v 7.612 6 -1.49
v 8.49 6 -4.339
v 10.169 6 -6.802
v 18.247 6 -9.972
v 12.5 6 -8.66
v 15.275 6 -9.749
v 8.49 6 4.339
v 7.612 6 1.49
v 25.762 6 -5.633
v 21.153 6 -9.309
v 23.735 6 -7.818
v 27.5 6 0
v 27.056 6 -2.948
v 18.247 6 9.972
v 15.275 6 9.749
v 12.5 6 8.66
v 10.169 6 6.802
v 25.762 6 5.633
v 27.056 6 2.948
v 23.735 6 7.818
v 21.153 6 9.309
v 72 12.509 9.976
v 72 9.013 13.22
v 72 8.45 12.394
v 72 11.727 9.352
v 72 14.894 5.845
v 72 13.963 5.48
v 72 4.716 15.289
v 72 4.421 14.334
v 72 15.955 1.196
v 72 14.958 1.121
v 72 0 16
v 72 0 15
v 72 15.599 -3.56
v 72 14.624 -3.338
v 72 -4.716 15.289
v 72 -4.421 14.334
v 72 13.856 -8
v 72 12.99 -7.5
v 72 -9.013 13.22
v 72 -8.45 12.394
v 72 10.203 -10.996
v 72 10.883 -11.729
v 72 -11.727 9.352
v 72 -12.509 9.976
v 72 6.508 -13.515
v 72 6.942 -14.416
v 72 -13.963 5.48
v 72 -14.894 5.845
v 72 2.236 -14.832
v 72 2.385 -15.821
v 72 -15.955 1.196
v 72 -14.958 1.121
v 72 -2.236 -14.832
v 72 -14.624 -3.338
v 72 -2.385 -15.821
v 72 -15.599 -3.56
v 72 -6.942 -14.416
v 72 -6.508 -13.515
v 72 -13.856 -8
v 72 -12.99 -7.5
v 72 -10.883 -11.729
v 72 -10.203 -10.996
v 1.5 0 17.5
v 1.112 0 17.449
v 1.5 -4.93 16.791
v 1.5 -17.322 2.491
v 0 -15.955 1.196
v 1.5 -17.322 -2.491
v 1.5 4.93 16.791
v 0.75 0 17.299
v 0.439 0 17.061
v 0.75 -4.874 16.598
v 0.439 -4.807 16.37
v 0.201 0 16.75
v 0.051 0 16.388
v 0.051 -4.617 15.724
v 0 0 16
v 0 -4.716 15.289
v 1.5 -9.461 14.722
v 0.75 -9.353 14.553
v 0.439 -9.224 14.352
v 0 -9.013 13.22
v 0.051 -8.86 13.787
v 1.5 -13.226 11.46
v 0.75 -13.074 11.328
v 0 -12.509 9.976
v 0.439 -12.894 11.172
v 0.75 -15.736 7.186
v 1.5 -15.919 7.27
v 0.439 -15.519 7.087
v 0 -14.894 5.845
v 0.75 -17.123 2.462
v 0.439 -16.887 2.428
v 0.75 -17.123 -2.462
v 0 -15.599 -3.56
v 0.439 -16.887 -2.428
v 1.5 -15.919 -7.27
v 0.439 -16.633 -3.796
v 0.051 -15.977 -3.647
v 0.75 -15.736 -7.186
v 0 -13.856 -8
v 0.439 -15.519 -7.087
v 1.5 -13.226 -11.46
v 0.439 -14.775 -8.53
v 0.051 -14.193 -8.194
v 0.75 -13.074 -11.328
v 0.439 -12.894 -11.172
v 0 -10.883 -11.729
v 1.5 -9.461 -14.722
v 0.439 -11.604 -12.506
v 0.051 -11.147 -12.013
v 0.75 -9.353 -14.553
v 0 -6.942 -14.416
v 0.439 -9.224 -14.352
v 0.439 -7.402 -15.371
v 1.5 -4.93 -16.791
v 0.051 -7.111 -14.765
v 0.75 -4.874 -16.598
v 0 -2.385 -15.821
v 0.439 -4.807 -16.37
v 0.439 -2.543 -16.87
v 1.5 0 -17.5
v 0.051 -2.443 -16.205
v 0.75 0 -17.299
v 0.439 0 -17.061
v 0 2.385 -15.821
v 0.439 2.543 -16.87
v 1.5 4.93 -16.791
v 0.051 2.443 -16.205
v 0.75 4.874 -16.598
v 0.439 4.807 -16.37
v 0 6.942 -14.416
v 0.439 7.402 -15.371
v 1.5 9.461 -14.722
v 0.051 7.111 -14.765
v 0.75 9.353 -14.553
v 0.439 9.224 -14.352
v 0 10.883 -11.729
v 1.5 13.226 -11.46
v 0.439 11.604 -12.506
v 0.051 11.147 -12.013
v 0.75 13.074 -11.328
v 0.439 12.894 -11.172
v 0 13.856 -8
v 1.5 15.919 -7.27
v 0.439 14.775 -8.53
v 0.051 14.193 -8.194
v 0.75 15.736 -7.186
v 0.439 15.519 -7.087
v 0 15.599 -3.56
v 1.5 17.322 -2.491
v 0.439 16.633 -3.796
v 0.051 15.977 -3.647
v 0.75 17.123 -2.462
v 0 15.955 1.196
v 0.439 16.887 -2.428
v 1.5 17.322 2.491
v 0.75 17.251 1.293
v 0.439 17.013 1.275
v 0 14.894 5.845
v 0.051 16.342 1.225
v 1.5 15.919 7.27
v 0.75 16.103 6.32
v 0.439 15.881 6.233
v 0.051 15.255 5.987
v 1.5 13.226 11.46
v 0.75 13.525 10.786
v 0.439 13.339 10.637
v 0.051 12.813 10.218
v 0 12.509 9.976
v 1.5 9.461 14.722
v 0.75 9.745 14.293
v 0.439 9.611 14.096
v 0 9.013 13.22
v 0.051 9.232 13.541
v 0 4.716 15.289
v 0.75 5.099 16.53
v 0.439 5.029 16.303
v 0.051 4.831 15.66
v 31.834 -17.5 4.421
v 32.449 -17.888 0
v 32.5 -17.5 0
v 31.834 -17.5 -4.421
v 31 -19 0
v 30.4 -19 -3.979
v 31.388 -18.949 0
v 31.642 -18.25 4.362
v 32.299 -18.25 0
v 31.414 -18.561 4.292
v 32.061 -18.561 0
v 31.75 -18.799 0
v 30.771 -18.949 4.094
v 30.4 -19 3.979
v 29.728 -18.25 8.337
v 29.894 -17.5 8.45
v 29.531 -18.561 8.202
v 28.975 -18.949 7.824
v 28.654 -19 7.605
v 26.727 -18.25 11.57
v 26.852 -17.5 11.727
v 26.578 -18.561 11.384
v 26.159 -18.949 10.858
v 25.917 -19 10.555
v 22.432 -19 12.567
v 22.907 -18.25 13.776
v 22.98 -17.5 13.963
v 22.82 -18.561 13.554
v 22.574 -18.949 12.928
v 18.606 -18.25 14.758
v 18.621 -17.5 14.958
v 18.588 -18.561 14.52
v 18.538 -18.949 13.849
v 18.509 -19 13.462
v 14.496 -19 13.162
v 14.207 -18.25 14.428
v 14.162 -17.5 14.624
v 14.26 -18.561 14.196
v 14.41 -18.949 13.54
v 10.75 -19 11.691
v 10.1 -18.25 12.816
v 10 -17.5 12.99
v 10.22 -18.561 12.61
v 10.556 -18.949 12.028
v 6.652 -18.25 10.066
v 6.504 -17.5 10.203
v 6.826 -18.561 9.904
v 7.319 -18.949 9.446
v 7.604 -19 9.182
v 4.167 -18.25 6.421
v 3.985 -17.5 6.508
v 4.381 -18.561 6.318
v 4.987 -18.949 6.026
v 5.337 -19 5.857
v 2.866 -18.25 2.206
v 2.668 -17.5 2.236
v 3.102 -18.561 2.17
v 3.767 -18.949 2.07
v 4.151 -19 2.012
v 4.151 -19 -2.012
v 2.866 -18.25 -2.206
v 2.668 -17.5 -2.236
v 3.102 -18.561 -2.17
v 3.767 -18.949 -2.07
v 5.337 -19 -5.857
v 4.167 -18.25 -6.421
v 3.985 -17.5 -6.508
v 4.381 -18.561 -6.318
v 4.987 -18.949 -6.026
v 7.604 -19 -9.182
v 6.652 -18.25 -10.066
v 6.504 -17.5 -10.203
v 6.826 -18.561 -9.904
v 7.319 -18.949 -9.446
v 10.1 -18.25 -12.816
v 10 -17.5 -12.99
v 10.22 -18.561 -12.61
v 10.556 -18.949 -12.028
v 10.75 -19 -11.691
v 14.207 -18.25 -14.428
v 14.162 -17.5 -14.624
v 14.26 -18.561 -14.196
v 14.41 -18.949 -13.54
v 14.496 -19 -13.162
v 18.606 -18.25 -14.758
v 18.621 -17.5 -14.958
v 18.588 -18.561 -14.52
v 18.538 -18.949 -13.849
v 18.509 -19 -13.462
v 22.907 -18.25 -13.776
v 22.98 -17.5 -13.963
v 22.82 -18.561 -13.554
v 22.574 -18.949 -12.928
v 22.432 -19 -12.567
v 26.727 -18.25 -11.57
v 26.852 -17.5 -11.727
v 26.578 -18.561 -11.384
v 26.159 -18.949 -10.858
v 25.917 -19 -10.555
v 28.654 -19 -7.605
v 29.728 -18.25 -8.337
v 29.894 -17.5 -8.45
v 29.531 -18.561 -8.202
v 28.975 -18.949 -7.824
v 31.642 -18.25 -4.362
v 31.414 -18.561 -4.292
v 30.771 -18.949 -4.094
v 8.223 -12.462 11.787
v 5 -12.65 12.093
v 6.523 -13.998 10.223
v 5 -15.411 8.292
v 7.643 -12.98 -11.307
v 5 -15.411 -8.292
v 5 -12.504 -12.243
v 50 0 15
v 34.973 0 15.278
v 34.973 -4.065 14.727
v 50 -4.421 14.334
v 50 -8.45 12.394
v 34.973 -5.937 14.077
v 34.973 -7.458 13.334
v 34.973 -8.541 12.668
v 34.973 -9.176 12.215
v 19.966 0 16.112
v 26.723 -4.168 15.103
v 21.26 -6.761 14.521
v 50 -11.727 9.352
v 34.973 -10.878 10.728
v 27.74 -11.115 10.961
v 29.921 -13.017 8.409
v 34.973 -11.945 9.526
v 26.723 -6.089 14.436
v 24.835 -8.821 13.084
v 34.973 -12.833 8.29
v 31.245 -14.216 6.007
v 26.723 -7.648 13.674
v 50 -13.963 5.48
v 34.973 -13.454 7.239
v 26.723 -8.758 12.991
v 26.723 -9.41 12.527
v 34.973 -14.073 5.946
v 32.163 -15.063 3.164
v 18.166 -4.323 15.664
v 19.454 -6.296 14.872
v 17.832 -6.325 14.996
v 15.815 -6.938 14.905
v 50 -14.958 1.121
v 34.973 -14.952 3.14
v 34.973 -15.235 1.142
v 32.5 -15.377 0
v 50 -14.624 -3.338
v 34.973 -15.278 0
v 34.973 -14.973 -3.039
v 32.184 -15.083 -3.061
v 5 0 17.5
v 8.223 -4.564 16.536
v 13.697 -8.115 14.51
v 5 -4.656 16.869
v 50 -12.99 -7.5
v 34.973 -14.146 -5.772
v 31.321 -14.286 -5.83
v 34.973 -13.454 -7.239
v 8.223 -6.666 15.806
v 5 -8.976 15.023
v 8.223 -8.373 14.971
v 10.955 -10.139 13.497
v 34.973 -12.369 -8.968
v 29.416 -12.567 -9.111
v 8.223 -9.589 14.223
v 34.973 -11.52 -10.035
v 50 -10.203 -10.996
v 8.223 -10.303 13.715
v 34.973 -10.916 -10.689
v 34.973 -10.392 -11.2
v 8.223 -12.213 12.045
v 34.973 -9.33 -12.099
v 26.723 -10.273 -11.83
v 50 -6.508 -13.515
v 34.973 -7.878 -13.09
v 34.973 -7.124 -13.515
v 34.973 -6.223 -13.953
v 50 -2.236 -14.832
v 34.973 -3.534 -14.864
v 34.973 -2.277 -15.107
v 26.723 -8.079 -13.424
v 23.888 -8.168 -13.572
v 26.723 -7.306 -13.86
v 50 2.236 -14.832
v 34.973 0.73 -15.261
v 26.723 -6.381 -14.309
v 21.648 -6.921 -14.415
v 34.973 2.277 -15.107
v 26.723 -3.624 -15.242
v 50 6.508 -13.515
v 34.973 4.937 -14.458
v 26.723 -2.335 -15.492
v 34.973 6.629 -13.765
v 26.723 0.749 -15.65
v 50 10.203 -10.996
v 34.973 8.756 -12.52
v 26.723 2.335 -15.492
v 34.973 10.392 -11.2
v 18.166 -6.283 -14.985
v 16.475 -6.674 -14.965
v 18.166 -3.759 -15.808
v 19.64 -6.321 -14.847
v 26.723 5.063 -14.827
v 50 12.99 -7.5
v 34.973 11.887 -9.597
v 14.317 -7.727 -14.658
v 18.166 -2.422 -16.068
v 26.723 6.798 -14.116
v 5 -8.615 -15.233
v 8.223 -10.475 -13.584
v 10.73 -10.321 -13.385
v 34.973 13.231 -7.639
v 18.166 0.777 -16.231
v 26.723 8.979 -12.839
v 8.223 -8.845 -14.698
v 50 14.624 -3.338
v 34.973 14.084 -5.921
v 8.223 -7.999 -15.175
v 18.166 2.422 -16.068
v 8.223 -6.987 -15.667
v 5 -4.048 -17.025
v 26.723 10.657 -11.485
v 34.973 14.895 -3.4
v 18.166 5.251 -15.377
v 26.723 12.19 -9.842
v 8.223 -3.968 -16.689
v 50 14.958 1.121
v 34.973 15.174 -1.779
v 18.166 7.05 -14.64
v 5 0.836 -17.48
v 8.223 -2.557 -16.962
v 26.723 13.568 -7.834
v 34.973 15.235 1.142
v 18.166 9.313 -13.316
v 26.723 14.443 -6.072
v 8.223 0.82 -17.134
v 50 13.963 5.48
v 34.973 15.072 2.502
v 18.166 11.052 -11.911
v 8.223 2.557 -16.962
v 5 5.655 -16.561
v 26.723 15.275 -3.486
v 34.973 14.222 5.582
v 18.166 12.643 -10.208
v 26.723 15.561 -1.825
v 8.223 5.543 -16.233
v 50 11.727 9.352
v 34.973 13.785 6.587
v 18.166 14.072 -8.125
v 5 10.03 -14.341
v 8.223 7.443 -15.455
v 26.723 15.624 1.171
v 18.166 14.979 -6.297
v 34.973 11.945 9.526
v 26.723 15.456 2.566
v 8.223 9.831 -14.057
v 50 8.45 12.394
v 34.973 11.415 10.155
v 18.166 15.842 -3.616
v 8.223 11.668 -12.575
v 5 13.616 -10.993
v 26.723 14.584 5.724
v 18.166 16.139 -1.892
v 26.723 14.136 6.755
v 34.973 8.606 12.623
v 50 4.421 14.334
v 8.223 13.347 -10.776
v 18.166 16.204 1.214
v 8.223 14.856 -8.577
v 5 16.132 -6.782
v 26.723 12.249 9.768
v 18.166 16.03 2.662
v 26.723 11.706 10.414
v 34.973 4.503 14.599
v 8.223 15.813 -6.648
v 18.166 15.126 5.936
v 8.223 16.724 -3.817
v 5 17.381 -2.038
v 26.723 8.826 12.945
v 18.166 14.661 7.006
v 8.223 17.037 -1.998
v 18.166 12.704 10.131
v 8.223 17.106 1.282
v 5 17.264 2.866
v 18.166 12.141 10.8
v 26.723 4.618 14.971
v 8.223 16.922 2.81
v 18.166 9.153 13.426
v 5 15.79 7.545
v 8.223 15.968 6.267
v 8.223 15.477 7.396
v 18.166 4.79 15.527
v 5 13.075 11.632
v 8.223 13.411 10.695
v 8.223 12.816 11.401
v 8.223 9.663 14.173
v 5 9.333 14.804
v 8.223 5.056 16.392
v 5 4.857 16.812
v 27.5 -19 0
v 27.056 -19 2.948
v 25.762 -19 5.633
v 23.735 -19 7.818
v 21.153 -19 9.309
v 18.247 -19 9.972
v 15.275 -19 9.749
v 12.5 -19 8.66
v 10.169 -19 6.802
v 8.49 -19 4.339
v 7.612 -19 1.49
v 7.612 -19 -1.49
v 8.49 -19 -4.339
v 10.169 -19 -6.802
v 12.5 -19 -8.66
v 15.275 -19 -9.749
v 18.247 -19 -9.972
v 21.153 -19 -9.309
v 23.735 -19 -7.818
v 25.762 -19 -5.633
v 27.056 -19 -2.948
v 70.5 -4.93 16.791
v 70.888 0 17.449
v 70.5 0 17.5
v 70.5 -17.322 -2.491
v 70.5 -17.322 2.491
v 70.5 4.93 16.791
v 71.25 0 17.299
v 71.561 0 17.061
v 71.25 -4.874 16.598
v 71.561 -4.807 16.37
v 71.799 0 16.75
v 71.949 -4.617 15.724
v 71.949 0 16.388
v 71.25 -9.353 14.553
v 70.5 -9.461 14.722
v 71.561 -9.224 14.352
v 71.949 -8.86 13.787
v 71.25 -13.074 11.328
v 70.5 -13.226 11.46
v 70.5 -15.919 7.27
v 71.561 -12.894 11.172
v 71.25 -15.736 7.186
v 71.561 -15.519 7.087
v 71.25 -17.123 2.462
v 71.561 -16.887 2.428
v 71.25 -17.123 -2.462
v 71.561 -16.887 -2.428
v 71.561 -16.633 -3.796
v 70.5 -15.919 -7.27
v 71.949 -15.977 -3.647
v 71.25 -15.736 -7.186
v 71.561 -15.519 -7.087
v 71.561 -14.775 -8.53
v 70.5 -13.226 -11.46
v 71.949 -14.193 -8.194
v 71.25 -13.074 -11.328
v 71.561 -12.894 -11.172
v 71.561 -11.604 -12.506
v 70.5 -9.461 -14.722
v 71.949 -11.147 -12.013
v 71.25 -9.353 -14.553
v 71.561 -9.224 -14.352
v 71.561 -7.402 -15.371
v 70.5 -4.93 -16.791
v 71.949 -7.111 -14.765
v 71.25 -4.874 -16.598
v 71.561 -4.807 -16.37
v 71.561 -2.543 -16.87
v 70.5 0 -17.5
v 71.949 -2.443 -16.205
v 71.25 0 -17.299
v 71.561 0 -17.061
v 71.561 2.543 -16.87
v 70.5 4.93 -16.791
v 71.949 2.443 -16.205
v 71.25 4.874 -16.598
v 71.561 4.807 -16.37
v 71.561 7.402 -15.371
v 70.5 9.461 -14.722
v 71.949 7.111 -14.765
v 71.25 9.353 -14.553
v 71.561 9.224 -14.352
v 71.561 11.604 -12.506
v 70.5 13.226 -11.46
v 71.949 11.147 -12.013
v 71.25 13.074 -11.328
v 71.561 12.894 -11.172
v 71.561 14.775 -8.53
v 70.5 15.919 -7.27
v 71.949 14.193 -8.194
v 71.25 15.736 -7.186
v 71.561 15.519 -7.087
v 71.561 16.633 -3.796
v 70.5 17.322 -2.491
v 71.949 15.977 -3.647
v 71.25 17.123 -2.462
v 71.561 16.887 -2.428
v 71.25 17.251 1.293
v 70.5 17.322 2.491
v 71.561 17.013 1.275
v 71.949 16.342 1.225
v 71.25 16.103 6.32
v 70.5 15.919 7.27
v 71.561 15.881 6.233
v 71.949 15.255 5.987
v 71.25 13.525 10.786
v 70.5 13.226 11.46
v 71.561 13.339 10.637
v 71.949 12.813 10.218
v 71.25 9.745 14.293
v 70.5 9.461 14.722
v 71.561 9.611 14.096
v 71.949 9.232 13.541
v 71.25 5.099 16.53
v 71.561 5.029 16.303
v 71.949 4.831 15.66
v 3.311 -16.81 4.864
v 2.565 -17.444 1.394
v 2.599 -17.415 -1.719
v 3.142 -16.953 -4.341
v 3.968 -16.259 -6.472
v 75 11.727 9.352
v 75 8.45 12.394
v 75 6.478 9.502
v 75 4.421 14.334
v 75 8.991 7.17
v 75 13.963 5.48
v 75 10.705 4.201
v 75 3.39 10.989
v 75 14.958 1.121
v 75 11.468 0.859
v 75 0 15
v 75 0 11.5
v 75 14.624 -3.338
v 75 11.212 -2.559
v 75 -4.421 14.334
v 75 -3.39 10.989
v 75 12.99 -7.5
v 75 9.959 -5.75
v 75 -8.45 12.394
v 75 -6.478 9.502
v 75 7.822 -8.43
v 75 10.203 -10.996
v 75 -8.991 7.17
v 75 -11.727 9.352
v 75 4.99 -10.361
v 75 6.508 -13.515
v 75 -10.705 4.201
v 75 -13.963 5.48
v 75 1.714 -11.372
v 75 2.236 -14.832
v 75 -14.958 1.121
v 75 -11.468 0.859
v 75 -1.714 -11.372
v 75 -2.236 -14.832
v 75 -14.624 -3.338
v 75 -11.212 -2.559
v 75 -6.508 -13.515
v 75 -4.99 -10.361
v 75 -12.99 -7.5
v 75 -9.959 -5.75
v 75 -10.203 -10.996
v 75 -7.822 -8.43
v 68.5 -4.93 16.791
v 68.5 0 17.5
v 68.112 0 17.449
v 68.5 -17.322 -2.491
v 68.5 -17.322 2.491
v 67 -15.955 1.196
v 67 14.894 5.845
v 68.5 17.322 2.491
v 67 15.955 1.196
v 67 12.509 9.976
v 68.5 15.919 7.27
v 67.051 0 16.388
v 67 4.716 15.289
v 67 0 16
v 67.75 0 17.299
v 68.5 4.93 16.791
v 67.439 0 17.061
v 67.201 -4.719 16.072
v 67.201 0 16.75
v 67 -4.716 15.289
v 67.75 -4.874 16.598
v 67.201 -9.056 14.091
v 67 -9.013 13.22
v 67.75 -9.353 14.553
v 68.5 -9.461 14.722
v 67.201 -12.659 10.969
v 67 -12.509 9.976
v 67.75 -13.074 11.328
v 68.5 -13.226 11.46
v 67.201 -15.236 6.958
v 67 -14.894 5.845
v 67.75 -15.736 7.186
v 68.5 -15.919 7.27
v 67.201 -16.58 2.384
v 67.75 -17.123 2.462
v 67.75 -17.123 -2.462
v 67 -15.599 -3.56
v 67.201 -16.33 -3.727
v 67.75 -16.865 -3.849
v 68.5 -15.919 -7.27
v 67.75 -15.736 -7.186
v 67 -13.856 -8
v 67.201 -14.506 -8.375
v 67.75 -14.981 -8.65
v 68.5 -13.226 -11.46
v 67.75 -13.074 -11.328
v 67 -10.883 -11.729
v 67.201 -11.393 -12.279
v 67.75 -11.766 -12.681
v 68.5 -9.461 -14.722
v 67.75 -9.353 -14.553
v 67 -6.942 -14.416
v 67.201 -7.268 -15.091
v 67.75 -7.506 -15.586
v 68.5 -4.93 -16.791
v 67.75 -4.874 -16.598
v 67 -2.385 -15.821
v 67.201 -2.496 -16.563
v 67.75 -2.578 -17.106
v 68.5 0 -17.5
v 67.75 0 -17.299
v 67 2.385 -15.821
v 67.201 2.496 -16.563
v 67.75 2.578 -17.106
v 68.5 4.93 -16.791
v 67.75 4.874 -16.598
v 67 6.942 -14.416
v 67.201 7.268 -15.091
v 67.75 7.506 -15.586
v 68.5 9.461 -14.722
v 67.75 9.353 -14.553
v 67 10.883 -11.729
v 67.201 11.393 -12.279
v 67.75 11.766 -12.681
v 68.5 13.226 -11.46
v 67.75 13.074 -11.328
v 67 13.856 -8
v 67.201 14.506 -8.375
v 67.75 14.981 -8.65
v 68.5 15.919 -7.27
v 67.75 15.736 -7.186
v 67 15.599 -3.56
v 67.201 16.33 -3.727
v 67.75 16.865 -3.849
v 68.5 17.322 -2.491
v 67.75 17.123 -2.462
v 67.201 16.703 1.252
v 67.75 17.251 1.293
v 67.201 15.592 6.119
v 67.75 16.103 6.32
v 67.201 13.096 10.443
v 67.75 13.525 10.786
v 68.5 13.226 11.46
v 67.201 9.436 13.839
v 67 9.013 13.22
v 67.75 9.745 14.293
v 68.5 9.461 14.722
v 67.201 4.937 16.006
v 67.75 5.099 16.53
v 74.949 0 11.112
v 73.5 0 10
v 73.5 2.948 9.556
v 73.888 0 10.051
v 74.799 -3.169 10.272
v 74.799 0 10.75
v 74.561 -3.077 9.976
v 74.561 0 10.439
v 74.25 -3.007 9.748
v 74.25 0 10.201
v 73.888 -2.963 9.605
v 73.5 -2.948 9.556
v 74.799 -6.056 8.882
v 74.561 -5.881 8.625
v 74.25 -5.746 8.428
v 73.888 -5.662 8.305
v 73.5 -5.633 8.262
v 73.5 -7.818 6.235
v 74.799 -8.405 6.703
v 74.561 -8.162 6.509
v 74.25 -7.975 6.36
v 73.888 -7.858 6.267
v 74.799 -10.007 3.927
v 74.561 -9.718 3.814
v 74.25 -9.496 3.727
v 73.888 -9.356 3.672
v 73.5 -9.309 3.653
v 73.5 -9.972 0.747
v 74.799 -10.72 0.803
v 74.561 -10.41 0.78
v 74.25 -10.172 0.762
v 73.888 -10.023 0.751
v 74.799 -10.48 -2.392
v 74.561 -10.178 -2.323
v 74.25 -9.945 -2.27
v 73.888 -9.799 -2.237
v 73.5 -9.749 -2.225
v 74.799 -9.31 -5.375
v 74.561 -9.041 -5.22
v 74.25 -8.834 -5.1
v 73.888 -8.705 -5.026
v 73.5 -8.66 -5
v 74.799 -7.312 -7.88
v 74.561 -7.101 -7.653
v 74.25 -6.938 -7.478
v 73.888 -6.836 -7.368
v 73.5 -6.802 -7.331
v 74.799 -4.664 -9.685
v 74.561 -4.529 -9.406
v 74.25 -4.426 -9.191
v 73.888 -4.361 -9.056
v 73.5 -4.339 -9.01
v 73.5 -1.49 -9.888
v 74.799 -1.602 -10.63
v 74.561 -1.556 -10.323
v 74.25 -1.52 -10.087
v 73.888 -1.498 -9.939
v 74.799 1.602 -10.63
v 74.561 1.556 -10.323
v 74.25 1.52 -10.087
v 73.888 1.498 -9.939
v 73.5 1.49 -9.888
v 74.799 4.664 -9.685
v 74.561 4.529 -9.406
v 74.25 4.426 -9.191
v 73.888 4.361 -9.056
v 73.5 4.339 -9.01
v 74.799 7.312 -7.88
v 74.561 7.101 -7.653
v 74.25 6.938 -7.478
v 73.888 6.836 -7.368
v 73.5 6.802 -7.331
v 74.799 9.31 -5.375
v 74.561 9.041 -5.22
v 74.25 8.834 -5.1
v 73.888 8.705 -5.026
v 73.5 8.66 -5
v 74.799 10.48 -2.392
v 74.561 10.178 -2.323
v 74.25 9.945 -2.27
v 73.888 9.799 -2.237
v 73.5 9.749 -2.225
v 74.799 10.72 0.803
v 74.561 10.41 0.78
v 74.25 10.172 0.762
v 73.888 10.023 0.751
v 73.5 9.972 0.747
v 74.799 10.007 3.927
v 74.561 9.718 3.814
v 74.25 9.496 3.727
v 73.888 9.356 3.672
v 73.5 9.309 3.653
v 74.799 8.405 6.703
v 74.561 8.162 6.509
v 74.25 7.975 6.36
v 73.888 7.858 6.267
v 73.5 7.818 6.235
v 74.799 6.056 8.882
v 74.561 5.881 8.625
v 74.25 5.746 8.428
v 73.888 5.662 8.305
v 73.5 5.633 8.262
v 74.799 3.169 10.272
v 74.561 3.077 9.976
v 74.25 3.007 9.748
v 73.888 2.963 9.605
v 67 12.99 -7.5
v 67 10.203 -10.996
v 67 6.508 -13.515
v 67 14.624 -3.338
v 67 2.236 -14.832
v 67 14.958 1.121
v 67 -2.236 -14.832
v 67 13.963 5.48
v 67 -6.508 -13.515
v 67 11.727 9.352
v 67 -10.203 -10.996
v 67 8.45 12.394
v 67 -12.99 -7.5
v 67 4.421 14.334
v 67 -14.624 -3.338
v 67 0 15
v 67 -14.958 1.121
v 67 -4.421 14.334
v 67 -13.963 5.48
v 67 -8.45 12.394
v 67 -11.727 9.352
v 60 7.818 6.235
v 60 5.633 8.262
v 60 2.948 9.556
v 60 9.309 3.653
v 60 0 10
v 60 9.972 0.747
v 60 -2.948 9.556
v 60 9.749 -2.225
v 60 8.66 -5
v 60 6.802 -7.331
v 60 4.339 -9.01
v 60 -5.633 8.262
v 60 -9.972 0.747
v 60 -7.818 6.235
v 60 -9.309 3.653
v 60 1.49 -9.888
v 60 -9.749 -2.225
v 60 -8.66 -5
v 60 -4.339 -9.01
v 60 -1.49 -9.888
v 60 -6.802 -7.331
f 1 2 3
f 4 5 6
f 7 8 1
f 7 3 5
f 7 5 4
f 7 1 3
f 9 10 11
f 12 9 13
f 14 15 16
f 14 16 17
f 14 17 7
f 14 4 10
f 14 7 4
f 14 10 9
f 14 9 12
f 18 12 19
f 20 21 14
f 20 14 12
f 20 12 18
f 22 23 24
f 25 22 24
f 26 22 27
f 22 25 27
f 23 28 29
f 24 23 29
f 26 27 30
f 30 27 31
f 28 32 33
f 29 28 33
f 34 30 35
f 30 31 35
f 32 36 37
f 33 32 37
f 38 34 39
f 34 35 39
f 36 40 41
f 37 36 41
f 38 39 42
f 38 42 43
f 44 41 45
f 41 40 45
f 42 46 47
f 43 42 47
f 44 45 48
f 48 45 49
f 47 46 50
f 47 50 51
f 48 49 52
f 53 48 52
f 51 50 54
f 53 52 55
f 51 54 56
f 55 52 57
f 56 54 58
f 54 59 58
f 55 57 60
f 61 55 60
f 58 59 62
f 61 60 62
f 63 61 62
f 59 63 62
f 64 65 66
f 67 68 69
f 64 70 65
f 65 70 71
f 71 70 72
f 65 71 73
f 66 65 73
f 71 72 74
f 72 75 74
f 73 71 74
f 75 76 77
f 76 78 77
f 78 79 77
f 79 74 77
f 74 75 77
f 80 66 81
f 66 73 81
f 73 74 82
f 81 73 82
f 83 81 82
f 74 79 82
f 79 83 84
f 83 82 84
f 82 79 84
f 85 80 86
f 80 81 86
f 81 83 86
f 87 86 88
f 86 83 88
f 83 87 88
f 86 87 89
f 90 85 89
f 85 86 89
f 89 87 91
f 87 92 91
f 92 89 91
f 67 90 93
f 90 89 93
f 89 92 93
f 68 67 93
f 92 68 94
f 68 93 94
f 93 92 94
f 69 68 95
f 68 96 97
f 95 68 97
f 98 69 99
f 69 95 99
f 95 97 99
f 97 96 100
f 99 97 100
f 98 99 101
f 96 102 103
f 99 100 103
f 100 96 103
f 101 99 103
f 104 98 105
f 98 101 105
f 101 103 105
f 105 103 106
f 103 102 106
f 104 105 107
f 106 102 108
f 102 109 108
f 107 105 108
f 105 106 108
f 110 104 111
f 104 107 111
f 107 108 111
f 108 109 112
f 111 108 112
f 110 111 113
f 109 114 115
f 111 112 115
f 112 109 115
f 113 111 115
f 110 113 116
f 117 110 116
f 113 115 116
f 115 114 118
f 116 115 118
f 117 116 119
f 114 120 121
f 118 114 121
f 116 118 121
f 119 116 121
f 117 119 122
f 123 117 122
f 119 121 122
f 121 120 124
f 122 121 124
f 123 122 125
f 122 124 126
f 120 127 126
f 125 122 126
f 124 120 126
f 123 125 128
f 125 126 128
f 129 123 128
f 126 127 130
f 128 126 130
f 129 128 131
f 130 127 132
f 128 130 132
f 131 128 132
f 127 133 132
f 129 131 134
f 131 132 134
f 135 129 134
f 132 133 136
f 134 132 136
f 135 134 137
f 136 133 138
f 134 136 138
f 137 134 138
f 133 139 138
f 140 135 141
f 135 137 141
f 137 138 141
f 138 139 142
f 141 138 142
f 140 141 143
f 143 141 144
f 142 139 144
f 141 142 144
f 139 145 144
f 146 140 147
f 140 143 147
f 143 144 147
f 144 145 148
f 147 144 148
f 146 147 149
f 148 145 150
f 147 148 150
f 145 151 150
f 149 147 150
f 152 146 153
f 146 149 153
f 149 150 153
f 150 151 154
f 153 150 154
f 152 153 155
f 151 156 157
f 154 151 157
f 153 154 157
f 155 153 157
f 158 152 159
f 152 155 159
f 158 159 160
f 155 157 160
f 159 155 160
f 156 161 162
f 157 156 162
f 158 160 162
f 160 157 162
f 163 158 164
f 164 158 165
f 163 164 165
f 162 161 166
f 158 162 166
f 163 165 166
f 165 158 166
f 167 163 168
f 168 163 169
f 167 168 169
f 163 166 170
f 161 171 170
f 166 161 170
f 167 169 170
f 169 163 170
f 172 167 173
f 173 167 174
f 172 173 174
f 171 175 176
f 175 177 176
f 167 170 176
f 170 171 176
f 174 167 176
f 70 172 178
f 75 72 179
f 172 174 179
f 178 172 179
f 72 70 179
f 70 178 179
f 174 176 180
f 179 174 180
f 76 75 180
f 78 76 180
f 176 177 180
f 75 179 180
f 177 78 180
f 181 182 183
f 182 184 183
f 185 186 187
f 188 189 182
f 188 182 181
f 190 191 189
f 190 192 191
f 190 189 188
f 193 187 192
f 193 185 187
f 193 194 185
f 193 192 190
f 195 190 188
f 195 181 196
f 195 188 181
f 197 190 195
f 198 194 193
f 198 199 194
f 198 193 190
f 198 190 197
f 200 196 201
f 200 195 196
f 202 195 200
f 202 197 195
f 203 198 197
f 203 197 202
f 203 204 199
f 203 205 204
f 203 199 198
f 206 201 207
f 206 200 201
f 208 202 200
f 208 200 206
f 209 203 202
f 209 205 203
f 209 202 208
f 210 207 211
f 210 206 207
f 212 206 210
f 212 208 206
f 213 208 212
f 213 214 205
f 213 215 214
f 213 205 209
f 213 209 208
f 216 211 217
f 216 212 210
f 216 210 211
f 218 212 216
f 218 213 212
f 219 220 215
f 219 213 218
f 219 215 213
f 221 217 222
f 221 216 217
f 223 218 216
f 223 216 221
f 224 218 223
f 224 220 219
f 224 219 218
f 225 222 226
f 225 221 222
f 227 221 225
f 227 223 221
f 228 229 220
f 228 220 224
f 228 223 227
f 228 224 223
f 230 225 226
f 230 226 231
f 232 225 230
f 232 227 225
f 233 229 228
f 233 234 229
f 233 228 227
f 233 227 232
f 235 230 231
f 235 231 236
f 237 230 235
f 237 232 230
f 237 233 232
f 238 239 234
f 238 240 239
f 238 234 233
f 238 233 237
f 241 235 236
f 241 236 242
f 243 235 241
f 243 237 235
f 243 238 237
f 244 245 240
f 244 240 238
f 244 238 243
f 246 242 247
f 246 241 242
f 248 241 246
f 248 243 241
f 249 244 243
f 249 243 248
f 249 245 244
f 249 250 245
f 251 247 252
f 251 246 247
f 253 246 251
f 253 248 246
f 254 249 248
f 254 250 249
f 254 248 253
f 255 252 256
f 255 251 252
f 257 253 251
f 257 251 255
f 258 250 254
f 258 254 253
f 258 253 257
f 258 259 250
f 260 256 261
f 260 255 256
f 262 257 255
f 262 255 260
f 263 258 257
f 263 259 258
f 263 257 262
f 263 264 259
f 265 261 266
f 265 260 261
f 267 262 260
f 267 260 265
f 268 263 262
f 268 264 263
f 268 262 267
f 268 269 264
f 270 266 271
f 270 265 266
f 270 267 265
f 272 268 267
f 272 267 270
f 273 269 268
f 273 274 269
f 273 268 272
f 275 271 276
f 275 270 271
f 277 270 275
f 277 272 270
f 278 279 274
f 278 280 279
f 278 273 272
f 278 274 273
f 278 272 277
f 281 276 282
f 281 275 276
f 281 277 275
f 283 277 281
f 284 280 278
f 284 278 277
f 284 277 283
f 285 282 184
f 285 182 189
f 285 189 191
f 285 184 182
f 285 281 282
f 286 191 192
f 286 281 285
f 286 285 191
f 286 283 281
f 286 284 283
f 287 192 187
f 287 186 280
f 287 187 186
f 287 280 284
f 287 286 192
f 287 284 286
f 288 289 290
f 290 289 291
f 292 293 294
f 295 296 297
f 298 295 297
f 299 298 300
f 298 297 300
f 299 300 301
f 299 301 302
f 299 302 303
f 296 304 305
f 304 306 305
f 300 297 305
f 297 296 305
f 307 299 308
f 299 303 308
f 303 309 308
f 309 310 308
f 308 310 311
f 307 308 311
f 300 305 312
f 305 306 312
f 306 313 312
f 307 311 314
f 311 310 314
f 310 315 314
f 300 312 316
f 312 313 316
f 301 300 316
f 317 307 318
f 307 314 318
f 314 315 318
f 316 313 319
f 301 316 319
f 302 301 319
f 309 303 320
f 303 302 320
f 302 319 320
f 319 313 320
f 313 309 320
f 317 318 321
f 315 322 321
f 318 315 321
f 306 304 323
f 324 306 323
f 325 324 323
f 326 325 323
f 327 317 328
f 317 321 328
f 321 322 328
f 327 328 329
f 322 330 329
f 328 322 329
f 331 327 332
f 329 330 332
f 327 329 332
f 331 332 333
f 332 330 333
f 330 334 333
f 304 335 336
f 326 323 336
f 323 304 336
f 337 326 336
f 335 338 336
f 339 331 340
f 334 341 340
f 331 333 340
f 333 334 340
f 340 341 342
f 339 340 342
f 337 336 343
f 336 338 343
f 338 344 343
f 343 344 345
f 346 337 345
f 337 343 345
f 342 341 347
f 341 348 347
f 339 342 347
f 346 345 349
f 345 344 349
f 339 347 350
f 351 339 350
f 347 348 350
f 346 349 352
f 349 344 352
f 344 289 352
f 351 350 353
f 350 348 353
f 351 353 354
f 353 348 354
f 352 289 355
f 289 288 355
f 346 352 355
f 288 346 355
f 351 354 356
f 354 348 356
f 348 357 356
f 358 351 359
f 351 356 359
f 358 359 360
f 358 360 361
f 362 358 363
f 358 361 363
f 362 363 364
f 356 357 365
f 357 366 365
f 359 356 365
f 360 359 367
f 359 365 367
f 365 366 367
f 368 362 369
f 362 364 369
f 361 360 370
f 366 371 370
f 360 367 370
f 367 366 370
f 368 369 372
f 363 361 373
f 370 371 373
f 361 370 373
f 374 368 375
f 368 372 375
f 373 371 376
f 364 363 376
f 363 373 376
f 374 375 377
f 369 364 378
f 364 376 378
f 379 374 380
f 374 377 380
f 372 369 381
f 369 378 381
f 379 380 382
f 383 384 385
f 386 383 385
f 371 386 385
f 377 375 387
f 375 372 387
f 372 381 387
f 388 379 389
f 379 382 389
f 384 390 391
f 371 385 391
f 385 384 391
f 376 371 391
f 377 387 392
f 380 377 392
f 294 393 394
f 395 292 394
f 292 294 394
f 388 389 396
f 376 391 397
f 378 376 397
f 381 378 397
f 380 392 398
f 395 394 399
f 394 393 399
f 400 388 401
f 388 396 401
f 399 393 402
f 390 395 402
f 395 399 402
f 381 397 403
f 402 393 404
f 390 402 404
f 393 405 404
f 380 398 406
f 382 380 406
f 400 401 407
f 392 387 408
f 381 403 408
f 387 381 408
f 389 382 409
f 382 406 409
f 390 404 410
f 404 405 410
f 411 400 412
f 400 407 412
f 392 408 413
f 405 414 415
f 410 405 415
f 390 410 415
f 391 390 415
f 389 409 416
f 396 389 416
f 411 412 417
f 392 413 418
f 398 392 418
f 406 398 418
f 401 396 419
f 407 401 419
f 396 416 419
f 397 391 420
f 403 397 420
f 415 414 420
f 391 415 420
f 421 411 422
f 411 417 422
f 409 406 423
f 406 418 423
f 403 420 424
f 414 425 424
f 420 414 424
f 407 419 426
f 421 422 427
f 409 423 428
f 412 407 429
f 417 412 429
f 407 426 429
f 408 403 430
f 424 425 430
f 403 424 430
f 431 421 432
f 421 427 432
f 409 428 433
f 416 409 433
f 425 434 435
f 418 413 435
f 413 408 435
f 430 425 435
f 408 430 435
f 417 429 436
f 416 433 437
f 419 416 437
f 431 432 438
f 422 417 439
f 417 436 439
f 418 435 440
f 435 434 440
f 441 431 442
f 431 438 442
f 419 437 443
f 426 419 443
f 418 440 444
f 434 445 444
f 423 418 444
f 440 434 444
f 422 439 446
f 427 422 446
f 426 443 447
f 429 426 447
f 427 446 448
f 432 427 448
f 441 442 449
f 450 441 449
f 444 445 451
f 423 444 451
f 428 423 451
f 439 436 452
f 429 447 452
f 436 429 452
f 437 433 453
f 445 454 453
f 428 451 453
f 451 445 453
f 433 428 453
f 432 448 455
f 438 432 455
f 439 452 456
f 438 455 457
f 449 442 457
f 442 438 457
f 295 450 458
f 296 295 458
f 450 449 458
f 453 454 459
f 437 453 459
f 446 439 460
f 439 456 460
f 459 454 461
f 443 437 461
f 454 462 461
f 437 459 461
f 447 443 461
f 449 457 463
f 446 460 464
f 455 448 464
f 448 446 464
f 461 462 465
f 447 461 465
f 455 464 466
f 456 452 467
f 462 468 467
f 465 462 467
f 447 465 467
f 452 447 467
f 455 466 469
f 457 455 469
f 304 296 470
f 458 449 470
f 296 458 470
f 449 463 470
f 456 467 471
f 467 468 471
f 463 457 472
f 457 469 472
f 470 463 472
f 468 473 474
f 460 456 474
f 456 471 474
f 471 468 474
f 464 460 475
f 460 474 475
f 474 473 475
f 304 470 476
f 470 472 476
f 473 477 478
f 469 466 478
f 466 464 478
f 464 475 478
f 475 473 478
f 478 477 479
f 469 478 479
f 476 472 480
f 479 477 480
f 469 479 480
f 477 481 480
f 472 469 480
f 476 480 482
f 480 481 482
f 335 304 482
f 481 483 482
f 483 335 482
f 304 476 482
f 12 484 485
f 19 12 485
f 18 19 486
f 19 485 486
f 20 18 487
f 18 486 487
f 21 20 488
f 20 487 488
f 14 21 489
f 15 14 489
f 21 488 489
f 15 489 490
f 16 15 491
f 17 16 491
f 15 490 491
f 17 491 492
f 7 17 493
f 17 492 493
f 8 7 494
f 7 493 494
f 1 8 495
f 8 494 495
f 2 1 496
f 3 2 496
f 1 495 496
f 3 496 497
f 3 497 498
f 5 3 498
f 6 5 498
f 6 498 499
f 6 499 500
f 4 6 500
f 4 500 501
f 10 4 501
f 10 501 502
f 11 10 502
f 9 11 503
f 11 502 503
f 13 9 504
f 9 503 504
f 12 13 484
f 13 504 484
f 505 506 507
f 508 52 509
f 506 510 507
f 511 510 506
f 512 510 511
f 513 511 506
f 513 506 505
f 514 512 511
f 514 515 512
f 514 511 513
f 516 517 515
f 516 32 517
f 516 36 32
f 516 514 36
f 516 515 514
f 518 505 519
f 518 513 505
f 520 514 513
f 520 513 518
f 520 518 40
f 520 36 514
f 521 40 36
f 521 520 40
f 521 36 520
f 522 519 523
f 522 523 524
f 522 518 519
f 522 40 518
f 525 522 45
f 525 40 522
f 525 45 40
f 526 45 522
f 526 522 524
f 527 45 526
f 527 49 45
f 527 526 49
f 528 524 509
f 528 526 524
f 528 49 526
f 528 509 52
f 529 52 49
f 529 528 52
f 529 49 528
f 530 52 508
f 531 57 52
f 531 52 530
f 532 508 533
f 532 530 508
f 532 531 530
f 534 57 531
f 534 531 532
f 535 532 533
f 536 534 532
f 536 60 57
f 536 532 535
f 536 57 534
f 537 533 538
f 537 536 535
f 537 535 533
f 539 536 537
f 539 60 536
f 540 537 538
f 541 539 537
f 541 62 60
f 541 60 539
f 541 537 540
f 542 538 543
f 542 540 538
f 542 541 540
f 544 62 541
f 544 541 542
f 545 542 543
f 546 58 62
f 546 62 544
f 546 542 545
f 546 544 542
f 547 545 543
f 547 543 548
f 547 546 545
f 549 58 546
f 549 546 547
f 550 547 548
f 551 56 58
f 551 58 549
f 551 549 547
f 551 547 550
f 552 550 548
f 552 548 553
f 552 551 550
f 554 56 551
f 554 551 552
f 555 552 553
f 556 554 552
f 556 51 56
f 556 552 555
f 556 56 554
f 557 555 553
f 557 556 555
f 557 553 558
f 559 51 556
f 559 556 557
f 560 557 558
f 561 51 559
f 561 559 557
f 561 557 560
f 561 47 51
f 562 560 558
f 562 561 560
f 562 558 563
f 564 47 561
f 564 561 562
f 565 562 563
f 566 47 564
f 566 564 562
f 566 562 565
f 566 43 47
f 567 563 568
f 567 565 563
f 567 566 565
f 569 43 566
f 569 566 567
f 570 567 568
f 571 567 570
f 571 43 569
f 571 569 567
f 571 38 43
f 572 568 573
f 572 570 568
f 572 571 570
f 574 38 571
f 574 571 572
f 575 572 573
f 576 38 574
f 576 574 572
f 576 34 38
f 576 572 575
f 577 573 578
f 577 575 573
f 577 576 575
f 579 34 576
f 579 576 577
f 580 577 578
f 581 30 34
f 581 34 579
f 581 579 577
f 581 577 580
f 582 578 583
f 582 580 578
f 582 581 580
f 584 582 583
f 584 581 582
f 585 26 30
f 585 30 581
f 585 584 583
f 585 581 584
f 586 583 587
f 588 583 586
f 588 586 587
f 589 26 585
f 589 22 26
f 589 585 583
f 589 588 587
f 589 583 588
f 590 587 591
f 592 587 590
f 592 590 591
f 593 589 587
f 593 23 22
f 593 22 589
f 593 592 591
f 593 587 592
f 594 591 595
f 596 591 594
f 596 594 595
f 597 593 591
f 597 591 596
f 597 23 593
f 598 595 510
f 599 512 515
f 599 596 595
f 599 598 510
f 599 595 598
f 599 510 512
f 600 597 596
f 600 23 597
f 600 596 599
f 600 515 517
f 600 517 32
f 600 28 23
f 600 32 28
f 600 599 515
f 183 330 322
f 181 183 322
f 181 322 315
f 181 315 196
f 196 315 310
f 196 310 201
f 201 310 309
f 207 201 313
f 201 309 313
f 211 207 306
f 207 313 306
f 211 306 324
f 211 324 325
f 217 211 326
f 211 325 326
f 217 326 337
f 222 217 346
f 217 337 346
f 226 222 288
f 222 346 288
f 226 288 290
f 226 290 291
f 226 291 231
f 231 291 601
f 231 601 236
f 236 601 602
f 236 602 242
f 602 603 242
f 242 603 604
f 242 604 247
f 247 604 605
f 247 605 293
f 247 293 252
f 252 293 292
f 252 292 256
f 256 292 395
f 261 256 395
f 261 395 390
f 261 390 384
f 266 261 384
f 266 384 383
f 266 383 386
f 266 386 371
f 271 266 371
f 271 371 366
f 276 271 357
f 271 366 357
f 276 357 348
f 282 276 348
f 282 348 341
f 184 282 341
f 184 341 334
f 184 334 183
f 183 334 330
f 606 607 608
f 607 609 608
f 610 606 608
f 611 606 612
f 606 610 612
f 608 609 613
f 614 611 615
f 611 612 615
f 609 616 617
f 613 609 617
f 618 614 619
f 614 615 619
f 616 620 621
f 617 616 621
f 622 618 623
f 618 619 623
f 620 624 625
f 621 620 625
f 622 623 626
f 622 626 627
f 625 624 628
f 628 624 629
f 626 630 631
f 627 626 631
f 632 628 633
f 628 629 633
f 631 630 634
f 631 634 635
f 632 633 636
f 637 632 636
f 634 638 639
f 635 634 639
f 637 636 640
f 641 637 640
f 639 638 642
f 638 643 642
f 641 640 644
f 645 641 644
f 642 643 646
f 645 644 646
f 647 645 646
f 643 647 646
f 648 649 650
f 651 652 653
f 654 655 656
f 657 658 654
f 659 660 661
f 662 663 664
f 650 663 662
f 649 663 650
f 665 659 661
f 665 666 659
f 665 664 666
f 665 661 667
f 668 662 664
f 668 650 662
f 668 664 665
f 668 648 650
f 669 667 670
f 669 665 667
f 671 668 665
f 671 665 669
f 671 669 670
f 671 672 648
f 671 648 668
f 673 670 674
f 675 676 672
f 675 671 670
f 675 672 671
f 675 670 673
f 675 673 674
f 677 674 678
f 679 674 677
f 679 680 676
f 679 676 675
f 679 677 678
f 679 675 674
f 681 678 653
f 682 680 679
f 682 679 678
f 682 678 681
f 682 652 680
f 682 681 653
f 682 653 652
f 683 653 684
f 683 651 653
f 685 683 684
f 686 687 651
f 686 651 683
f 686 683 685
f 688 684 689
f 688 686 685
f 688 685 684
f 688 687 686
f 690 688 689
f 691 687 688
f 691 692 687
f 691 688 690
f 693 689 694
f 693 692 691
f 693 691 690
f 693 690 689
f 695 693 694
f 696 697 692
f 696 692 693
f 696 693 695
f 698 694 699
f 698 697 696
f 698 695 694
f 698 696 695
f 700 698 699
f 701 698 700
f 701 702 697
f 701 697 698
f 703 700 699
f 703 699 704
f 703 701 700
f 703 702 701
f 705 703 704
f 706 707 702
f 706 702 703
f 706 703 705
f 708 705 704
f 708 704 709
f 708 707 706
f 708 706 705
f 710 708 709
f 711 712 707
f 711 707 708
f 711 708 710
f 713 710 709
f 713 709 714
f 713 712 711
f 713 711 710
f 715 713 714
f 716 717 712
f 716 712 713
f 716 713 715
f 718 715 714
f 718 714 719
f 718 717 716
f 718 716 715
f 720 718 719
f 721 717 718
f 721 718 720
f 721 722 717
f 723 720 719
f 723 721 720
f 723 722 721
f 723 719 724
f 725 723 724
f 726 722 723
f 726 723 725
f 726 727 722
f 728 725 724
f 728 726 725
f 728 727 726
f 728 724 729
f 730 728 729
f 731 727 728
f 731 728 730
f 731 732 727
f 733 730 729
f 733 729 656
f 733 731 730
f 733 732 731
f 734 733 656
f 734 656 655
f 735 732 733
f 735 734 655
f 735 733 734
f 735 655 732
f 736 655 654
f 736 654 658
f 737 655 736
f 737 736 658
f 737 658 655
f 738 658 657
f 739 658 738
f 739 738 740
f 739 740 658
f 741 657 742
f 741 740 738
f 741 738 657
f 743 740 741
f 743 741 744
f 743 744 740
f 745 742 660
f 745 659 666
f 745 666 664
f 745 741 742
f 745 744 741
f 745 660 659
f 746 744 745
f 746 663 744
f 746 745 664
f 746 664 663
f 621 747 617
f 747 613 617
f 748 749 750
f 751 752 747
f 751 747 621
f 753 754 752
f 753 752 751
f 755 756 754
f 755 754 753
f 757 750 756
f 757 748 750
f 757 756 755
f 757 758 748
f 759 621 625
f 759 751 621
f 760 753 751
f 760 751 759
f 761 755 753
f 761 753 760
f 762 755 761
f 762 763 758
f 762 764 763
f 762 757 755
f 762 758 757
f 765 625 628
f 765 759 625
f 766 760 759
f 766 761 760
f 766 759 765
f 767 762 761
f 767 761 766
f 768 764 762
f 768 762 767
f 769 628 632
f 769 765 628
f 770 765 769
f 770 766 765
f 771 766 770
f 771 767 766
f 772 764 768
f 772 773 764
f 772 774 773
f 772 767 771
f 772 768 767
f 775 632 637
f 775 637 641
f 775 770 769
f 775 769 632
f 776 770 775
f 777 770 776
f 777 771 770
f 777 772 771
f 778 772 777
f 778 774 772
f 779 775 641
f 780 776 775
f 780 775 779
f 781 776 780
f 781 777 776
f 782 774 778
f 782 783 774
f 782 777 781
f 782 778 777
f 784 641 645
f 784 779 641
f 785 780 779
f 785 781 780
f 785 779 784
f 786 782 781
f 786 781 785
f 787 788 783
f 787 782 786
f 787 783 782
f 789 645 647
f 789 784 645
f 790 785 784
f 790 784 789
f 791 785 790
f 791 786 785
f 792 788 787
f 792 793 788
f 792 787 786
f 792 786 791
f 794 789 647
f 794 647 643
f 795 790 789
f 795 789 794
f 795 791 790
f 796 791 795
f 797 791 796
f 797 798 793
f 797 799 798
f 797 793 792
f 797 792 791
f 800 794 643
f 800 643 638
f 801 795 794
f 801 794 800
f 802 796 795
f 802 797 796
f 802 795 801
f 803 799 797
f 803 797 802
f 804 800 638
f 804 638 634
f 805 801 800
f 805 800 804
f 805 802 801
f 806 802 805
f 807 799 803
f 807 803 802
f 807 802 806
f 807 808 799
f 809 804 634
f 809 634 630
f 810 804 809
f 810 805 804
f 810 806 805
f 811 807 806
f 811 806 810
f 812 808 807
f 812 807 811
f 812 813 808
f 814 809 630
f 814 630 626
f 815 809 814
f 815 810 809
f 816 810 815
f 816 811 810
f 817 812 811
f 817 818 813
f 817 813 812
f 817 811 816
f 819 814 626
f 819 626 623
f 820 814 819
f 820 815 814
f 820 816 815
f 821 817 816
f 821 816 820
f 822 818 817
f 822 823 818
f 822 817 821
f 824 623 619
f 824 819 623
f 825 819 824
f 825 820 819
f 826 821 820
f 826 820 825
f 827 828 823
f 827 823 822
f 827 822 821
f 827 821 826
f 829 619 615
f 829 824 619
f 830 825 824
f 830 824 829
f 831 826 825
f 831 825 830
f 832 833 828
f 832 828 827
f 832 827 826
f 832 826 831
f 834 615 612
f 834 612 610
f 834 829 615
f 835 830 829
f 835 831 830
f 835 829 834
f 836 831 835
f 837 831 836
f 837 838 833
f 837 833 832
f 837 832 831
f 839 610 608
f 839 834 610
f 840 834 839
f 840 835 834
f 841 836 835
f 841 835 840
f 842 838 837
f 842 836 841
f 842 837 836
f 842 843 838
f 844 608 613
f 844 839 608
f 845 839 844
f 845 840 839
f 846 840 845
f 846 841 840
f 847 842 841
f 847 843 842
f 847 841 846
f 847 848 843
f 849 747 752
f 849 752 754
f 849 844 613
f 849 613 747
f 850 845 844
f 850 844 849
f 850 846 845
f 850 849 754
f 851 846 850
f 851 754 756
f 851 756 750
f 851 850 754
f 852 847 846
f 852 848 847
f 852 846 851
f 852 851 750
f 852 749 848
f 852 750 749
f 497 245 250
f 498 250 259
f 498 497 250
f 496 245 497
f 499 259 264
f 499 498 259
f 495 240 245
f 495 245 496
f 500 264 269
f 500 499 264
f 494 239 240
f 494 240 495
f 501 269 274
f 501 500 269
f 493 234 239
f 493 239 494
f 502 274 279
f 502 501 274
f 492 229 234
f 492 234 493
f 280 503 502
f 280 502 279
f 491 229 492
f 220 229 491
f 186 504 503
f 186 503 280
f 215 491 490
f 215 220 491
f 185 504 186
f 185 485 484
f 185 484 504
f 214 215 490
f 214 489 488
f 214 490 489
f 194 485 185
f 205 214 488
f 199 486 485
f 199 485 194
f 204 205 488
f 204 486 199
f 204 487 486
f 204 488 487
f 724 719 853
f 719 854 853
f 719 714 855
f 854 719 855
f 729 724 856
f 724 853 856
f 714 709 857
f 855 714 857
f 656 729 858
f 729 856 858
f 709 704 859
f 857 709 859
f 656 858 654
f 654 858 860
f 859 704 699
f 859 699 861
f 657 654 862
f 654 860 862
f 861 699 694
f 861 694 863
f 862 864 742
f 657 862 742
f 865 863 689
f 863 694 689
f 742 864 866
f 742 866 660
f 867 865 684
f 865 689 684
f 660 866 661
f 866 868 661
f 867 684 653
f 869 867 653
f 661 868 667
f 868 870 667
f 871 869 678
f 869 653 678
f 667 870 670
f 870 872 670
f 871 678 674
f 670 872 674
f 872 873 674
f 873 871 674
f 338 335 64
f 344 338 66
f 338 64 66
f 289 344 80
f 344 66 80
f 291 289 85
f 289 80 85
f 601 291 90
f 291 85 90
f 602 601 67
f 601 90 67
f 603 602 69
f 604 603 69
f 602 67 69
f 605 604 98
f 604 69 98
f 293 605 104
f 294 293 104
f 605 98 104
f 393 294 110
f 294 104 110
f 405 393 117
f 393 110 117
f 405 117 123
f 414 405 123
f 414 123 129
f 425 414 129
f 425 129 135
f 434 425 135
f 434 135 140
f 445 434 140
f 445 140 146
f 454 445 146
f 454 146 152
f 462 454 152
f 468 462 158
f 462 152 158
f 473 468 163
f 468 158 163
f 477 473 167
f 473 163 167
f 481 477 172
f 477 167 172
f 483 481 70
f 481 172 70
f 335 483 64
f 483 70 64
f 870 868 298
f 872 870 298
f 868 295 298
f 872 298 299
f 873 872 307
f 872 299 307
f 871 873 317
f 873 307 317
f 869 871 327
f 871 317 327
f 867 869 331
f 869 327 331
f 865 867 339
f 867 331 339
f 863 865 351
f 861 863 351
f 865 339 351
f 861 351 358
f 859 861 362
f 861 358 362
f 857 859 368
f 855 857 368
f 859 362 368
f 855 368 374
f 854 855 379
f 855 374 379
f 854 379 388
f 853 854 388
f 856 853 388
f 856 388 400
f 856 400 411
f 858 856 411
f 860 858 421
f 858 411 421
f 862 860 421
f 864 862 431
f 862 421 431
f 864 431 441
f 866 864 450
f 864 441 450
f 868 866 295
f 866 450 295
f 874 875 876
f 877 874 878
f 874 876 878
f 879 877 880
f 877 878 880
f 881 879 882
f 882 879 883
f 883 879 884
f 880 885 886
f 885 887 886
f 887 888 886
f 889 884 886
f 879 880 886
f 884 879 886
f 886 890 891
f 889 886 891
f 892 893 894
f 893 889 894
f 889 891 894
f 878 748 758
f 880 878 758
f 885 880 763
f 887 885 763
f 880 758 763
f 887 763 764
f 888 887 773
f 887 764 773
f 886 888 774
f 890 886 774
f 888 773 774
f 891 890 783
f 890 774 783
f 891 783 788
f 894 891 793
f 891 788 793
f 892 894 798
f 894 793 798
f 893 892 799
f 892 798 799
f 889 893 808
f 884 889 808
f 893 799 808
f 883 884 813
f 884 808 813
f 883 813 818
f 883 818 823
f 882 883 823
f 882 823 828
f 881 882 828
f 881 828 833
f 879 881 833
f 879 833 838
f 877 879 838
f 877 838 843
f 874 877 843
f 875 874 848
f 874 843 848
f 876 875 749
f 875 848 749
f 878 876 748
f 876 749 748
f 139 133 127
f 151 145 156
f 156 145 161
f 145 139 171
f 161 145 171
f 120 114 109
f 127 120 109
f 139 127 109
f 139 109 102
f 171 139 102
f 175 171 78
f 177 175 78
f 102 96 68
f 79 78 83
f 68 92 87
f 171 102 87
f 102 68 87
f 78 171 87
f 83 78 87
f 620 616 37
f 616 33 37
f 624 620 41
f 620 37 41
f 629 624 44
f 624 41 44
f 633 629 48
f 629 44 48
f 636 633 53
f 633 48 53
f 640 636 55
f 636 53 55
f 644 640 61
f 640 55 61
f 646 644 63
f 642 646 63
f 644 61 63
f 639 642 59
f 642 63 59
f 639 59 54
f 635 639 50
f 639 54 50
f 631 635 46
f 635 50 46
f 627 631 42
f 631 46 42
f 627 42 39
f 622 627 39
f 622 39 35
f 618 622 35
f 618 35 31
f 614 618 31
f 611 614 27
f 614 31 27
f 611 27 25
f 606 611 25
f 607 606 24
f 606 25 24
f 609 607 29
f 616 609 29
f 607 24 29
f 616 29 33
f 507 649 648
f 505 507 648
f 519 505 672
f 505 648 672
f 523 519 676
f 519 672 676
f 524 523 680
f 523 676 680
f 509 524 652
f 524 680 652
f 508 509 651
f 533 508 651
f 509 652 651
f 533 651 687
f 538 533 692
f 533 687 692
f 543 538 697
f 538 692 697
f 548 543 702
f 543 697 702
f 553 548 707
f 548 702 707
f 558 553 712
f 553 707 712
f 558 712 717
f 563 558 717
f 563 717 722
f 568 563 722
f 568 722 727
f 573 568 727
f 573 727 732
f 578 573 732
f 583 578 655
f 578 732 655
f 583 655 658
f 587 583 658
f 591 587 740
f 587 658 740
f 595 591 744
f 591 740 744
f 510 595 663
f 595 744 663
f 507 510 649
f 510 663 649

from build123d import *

# Parameters (mm, degrees)
F2_R     = 15
F3_DEPTH = 19
F4_R     = 10
F5_DEPTH = 25
F6_R     = 1.5


with BuildPart() as f1:
    # F0 (on Front) → F1 (revolve)
    with BuildSketch(Plane.XZ):
        with BuildLine():
            Line((0, 17.5), (0, 0))
            Line((0, 0), (60, 0))
            Line((60, 0), (60, 10))
            Line((60, 10), (75, 10))
            Line((75, 10), (75, 15))
            Line((75, 15), (72, 15))
            Line((72, 15), (72, 17.5))
            Line((72, 17.5), (67, 17.5))
            Line((67, 17.5), (67, 15))
            Line((67, 15), (50, 15))
            ThreePointArc((50, 15), (27.465305, 15.625482), (5, 17.5))
            Line((5, 17.5), (0, 17.5))
        make_face()
    revolve(axis=Axis((30, 0, 0), (1, 0, 0)))

    # F2 (on Front) → F3 (join)
    with BuildSketch(Plane.XZ):
        with Locations((17.5, 0)):
            Circle(F2_R)
    extrude(amount=F3_DEPTH)

    # F4 (on face) → F5 (cut)
    with BuildSketch(Plane.XZ.offset(19)):
        with Locations((17.5, 0)):
            Circle(F4_R)
    extrude(amount=-F5_DEPTH, mode=Mode.SUBTRACT)

    # F6
    f6_edges = [f1.edges().sort_by_distance(p)[0] for p in [
        (0, 0, -17.5),
        (2.5, -19, 0),
        (67, 0, -17.5),
        (72, 0, -17.5),
        (75, 0, -10),
    ]]
    fillet(f6_edges, radius=F6_R)


solid = f1.part
